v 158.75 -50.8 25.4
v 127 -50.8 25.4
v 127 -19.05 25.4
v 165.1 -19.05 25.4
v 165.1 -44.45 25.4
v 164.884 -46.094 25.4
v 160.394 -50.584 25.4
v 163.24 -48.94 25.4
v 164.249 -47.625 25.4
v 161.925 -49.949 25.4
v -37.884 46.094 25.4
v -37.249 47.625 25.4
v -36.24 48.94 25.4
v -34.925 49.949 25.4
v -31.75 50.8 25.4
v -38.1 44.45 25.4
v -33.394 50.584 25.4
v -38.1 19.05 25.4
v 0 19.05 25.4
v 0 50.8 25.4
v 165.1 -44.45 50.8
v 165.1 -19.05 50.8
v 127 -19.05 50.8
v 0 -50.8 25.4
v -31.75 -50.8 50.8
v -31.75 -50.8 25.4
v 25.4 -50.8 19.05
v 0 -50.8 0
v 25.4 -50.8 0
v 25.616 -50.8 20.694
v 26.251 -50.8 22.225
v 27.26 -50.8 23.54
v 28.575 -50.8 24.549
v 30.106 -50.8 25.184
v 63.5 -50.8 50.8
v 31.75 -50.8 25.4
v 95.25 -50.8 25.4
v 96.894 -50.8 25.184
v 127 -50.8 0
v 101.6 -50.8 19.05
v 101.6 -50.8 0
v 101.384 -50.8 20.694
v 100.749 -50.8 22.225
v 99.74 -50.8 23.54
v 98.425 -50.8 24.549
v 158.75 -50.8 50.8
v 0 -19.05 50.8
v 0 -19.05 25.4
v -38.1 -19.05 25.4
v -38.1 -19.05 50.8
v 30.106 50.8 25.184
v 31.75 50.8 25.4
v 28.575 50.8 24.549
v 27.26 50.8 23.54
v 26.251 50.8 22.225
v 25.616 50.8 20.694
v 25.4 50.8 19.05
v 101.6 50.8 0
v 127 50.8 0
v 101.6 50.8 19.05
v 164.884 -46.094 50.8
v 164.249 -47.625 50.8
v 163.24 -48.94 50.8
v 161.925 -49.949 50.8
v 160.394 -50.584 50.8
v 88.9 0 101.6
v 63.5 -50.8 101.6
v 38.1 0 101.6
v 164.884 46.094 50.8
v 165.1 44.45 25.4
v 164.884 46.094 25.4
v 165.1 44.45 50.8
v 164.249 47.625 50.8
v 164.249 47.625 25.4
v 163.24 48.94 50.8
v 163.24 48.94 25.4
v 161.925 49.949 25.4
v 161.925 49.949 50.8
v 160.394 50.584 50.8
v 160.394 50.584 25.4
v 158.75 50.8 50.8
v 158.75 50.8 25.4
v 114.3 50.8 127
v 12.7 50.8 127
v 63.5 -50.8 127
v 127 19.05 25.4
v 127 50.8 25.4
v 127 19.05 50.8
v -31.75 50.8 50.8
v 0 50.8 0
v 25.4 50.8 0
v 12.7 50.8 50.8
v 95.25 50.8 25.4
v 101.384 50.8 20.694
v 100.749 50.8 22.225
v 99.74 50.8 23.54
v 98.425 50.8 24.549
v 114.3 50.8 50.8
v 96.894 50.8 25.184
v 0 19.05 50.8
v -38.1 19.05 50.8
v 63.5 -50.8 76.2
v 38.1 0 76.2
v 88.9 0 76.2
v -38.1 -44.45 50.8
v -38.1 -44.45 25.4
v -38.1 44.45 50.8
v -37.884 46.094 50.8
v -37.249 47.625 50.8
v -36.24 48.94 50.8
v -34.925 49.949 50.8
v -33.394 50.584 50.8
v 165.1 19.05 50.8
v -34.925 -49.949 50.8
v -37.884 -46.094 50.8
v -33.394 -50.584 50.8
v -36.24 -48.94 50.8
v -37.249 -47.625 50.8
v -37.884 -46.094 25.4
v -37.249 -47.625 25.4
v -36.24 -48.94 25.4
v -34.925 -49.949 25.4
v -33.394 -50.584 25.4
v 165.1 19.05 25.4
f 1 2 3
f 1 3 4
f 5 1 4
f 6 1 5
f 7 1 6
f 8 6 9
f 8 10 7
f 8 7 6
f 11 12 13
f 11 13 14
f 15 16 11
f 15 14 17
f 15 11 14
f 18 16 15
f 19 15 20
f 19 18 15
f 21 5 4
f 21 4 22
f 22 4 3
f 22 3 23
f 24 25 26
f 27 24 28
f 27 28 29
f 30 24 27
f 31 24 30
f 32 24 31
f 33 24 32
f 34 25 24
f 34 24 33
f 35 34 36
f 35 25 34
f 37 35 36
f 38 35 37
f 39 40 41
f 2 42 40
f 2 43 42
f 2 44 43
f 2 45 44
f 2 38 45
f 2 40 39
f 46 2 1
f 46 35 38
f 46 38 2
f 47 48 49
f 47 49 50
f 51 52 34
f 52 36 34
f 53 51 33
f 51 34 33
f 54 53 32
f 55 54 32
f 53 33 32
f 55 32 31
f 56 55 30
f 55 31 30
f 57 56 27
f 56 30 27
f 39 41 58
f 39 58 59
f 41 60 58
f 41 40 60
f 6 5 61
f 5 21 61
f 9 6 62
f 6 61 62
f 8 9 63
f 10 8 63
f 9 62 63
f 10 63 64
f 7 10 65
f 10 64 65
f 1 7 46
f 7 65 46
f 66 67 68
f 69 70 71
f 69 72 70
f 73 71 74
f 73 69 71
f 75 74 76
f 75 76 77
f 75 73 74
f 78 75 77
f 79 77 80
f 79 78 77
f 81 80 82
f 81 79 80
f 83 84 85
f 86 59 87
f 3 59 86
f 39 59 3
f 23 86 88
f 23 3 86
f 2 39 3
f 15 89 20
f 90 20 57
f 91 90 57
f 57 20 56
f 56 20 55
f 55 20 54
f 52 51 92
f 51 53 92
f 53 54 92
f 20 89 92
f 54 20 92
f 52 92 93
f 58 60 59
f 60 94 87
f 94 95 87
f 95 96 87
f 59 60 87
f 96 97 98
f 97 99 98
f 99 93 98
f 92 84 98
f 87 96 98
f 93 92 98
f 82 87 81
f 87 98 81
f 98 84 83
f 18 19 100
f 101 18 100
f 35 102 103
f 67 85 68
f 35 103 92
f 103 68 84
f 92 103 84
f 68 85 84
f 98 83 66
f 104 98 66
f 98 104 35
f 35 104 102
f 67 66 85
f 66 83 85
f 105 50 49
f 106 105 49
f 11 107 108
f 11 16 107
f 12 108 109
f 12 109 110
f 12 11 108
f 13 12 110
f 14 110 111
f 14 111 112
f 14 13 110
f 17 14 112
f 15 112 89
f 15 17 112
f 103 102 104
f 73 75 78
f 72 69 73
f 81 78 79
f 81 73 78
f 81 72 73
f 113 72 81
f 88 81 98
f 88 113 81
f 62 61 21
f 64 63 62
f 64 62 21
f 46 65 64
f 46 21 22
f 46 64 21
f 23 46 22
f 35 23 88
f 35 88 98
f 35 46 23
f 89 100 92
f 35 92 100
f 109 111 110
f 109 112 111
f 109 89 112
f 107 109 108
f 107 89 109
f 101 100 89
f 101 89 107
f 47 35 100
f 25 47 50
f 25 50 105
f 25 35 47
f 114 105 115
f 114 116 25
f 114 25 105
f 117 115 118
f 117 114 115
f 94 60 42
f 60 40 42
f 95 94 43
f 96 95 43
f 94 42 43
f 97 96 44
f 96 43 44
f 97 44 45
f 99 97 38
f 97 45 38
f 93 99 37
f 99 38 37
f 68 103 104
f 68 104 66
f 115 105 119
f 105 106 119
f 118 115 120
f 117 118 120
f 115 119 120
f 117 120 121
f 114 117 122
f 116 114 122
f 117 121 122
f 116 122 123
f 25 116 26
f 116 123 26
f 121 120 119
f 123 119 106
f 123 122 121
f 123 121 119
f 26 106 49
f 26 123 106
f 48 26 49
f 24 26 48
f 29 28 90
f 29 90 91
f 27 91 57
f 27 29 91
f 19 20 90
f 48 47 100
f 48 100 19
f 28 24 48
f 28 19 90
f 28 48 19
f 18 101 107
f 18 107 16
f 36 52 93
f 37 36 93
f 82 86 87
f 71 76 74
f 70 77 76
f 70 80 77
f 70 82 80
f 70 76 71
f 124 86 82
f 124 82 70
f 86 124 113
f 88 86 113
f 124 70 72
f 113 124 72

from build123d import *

# Parameters (mm, degrees)
F1_DEPTH  = 50.8
F2_R      = 6.35
F3_W      = 38.1
F3_H      = 25.4
F4_DEPTH  = 38.1
F5_W      = 38.1
F5_H      = 25.4
F6_DEPTH  = 38.1
F7_W      = 101.6
F7_H      = 101.6
F8_DEPTH  = 76.2
F9_W      = 50.8
F9_H      = 25.4
F10_DEPTH = 152.401
F12_DEPTH = 76.2
F14_DEPTH = 76.2
F15_R     = 6.35


with BuildPart() as f1:
    # F0 (on Front) → F1 (new body, symmetric)
    with BuildSketch(Plane.XZ):
        Polygon((0, 25.4), (0, 0), (25.4, 0), (25.4, 25.4), (101.6, 25.4), (101.6, 0), (127, 0), (127, 25.4), (165.1, 25.4), (165.1, 50.8), (-38.1, 50.8), (-38.1, 25.4), align=None)
    extrude(amount=F1_DEPTH, both=True)

    # F2
    f2_edges = [f1.edges().sort_by_distance(p)[0] for p in [
        (-38.1, -50.8, 38.1),
        (165.1, -50.8, 38.1),
        (165.1, 50.8, 38.1),
        (-38.1, 50.8, 38.1),
    ]]
    fillet(f2_edges, radius=F2_R)

    # F3 (on face) → F4 (cut, through all)
    with BuildSketch(Plane.YZ.offset(165.1)):
        with Locations((0, 38.1)):
            Rectangle(F3_W, F3_H)
    extrude(amount=-F4_DEPTH, mode=Mode.SUBTRACT)

    # F5 (on face) → F6 (cut, through all)
    with BuildSketch(Plane(origin=(-38.1, 0, 0), x_dir=(0, -1, 0), z_dir=(-1, 0, 0))):
        with Locations((0, 38.1)):
            Rectangle(F5_W, F5_H)
    extrude(amount=-F6_DEPTH, mode=Mode.SUBTRACT)

    # F7 (on face) → F8 (join)
    with BuildSketch(Plane.XY.offset(50.8)):
        with Locations((63.5, 0)):
            Rectangle(F7_W, F7_H)
    extrude(amount=F8_DEPTH)

    # F9 (on face) → F10 (cut, through all)
    with BuildSketch(Plane.YZ.offset(114.3)):
        with Locations((-25.4, 88.9)):
            Rectangle(F9_W, F9_H)
    extrude(amount=-F10_DEPTH, mode=Mode.SUBTRACT)

    # F11 (on face) → F12 (cut, through all)
    with BuildSketch(Plane.XY.offset(127)):
        Polygon((63.5, -50.8), (12.7, 50.8), (12.7, -50.8), align=None)
    extrude(amount=-F12_DEPTH, mode=Mode.SUBTRACT)

    # F13 (on face) → F14 (cut, through all)
    with BuildSketch(Plane.XY.offset(127)):
        Polygon((114.3, 50.8), (63.5, -50.8), (114.3, -50.8), align=None)
    extrude(amount=-F14_DEPTH, mode=Mode.SUBTRACT)

    # F15
    f15_edges = [f1.edges().sort_by_distance(p)[0] for p in [
        (25.4, 0, 25.4),
        (101.6, 0, 25.4),
    ]]
    fillet(f15_edges, radius=F15_R)


solid = f1.part
